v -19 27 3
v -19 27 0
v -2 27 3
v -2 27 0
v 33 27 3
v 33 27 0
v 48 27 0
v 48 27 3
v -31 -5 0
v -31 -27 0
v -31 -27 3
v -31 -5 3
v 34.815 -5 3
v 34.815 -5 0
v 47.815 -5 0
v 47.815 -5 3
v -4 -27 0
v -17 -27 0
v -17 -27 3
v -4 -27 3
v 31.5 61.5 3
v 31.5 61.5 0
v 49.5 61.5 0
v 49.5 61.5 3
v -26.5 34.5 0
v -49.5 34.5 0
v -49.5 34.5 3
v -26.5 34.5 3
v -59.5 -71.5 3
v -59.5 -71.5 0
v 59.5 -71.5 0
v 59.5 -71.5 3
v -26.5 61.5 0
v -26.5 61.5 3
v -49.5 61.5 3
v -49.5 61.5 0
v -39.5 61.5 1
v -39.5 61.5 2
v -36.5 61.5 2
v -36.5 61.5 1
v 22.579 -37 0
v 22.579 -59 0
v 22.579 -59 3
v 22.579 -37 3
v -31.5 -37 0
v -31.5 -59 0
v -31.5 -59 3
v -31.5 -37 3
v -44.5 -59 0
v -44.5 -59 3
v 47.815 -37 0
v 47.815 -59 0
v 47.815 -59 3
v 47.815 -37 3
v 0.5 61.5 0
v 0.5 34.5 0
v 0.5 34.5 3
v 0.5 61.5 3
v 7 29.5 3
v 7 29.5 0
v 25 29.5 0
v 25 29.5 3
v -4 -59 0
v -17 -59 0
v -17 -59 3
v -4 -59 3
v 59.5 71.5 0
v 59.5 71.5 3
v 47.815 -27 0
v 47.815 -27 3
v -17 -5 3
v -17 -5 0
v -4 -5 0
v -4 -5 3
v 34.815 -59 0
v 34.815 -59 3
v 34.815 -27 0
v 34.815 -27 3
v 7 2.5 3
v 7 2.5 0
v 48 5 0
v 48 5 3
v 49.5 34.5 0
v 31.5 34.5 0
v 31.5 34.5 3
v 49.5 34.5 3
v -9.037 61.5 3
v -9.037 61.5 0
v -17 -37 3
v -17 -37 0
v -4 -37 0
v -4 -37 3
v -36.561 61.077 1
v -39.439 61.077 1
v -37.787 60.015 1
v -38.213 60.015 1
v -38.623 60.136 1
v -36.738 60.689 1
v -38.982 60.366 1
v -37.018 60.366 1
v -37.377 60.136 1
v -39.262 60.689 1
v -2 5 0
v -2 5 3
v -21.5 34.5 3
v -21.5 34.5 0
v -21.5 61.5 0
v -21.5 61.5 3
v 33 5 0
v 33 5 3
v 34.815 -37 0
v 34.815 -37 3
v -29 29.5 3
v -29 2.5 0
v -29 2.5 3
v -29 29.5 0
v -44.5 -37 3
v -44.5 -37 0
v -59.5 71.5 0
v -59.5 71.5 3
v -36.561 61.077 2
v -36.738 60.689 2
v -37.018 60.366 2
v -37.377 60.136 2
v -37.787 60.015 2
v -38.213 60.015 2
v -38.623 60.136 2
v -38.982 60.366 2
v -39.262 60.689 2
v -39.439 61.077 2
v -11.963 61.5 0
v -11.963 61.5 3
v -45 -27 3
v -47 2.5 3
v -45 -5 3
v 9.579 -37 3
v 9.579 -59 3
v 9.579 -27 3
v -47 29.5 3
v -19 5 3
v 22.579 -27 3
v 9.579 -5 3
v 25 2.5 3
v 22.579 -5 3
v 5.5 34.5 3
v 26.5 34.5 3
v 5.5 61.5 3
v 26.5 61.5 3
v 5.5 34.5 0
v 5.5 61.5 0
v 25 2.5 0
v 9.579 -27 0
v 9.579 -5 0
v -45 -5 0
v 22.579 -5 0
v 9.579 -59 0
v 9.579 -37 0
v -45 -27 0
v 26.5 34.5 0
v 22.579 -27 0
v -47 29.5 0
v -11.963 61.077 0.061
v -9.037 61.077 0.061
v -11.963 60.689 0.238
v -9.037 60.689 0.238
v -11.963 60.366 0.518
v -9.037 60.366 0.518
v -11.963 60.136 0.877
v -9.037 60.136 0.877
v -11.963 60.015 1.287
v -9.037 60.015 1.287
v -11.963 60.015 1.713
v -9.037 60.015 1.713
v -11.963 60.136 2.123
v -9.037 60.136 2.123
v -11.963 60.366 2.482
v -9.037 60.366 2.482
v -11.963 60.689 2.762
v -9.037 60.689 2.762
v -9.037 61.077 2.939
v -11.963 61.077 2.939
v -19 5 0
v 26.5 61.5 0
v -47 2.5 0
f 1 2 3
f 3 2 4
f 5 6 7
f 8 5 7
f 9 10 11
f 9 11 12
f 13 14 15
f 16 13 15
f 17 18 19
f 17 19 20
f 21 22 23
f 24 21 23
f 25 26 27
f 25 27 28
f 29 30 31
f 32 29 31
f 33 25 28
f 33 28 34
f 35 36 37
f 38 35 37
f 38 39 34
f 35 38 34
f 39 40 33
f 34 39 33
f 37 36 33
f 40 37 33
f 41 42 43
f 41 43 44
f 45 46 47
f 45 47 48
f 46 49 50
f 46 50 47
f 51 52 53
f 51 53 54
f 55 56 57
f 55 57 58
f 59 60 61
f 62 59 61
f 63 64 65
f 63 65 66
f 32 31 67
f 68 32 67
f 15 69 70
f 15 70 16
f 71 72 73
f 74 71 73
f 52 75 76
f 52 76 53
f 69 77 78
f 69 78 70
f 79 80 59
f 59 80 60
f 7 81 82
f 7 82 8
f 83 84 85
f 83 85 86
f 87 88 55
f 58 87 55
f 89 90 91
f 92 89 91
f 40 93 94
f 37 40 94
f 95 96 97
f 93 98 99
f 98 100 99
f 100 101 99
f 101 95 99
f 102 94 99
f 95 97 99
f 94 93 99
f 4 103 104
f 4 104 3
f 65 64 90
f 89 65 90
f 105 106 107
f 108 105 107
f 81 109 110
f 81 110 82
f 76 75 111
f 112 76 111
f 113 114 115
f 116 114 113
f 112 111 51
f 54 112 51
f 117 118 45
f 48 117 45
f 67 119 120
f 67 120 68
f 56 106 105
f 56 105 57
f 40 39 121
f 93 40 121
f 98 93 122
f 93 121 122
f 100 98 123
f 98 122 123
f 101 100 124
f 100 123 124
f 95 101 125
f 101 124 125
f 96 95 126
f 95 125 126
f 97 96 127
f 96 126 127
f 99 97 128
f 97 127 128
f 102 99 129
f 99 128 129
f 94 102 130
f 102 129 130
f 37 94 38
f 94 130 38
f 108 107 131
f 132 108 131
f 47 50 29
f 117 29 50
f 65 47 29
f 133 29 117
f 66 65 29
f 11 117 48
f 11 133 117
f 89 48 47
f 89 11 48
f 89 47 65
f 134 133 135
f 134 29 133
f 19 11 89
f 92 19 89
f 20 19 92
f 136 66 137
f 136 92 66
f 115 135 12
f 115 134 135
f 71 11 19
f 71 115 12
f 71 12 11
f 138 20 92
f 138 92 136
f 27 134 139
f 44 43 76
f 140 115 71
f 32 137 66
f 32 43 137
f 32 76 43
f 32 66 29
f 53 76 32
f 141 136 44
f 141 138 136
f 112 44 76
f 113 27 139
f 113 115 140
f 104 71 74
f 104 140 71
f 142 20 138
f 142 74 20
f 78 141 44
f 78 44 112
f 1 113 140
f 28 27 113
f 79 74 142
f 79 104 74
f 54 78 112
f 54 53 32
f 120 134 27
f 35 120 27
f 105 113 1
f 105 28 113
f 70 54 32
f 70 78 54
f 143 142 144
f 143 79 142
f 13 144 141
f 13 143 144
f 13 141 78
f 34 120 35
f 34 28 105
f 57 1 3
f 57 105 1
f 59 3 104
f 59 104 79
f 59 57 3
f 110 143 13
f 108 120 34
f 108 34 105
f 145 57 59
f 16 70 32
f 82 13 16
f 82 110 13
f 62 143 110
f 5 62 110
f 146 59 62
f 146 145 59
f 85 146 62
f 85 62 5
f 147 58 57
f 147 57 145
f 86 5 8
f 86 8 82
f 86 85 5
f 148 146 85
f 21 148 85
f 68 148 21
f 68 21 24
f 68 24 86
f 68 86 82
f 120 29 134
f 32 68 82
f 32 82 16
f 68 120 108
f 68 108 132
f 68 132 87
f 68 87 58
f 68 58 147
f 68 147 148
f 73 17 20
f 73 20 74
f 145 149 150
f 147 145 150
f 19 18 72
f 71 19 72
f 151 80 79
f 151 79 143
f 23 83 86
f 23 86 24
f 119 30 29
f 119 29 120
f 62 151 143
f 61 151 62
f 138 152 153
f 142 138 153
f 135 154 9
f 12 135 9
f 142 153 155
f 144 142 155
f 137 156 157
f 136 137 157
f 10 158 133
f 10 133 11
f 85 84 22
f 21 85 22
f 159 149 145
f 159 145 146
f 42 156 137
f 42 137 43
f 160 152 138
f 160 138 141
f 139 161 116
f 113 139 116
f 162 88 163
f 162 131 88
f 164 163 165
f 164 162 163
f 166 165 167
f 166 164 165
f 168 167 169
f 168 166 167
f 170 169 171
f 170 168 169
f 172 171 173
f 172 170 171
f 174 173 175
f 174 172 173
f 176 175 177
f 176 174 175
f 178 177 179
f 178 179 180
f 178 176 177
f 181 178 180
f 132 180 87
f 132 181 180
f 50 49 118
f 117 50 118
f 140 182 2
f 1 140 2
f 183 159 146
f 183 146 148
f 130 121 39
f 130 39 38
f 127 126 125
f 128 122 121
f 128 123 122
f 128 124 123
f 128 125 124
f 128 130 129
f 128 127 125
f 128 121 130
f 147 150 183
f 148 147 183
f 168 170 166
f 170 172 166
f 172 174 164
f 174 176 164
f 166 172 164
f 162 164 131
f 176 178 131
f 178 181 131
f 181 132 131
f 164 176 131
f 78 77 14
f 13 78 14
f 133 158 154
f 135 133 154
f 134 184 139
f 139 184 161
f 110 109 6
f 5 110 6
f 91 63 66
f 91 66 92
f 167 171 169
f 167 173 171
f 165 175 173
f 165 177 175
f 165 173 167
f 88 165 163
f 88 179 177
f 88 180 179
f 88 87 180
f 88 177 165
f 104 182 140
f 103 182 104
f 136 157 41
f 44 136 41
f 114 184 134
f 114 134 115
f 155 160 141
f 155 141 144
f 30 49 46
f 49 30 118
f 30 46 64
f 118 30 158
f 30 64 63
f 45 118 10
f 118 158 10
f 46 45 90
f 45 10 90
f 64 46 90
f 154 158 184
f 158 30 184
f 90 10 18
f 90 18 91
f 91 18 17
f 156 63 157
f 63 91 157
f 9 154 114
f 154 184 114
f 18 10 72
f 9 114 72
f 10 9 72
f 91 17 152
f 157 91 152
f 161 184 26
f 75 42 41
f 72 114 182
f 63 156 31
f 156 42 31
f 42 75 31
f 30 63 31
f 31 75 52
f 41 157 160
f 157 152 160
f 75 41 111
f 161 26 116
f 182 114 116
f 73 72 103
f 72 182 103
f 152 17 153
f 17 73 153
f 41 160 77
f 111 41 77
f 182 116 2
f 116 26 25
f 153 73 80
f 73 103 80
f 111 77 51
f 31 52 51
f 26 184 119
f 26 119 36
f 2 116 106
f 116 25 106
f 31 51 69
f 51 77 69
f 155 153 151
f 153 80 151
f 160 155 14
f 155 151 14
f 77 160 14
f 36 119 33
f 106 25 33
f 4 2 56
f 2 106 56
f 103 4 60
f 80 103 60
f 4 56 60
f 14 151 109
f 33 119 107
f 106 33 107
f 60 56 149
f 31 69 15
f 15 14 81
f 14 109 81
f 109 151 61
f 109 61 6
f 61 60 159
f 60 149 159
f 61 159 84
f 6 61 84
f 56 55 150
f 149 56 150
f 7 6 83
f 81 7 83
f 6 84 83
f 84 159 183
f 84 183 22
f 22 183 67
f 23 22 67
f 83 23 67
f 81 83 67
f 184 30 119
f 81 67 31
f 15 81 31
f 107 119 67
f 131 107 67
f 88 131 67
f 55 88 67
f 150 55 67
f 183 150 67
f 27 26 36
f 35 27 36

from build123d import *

# Parameters (mm, degrees)
F0_W     = 119
F0_H     = 143
F0_W_2   = 13
F0_H_2   = 22
F0_W_3   = 14
F0_W_4   = 18
F0_H_3   = 27
F0_W_5   = 17
F0_W_6   = 23
F0_W_7   = 22
F0_W_8   = 15
F0_W_9   = 21
F1_DEPTH = 3
F2_W     = 1.5
F2_H     = 1
F4_W     = 1.463154
F4_H     = 1.5


with BuildPart() as f1:
    # F0 (on Top) → F1 (new body)
    with BuildSketch(Plane.XY):
        Rectangle(F0_W, F0_H)
        with Locations((-38, -48)):
            Rectangle(F0_W_2, F0_H_2, mode=Mode.SUBTRACT)
        with Locations((-10.5, -48)):
            Rectangle(F0_W_2, F0_H_2, mode=Mode.SUBTRACT)
        with Locations((-38, -16)):
            Rectangle(F0_W_3, F0_H_2, mode=Mode.SUBTRACT)
        with Locations((-10.5, -16)):
            Rectangle(F0_W_2, F0_H_2, mode=Mode.SUBTRACT)
        with Locations((16.07851, -48)):
            Rectangle(F0_W_2, F0_H_2, mode=Mode.SUBTRACT)
        with Locations((41.315013, -48)):
            Rectangle(F0_W_2, F0_H_2, mode=Mode.SUBTRACT)
        with Locations((16.07851, -16)):
            Rectangle(F0_W_2, F0_H_2, mode=Mode.SUBTRACT)
        with Locations((41.315013, -16)):
            Rectangle(F0_W_2, F0_H_2, mode=Mode.SUBTRACT)
        with Locations((-38, 16)):
            Rectangle(F0_W_4, F0_H_3, mode=Mode.SUBTRACT)
        with Locations((-10.5, 16)):
            Rectangle(F0_W_5, F0_H_2, mode=Mode.SUBTRACT)
        with Locations((-38, 48)):
            Rectangle(F0_W_6, F0_H_3, mode=Mode.SUBTRACT)
        with Locations((-10.5, 48)):
            Rectangle(F0_W_7, F0_H_3, mode=Mode.SUBTRACT)
        with Locations((16, 16)):
            Rectangle(F0_W_4, F0_H_3, mode=Mode.SUBTRACT)
        with Locations((40.5, 16)):
            Rectangle(F0_W_8, F0_H_2, mode=Mode.SUBTRACT)
        with Locations((16, 48)):
            Rectangle(F0_W_9, F0_H_3, mode=Mode.SUBTRACT)
        with Locations((40.5, 48)):
            Rectangle(F0_W_4, F0_H_3, mode=Mode.SUBTRACT)
    extrude(amount=F1_DEPTH)

    # F2 (on face) → F3 (revolve)
    with BuildSketch(Plane.XZ.offset(-61.5)):
        with Locations((-37.25, 1.5)):
            Rectangle(F2_W, F2_H)
    revolve(axis=Axis((-38, 61.5, 1.5), (0, 0, -1)))

    # F4 (on face) → F5 (revolve)
    with BuildSketch(Plane.XZ.offset(-61.5)):
        with Locations((-11.231577, 2.25)):
            Rectangle(F4_W, F4_H)
        with Locations((-9.768423, 2.25)):
            Rectangle(F4_W, F4_H)
    revolve(axis=Axis((-10.5, 61.5, 1.5), (-1, 0, 0)))


solid = f1.part
